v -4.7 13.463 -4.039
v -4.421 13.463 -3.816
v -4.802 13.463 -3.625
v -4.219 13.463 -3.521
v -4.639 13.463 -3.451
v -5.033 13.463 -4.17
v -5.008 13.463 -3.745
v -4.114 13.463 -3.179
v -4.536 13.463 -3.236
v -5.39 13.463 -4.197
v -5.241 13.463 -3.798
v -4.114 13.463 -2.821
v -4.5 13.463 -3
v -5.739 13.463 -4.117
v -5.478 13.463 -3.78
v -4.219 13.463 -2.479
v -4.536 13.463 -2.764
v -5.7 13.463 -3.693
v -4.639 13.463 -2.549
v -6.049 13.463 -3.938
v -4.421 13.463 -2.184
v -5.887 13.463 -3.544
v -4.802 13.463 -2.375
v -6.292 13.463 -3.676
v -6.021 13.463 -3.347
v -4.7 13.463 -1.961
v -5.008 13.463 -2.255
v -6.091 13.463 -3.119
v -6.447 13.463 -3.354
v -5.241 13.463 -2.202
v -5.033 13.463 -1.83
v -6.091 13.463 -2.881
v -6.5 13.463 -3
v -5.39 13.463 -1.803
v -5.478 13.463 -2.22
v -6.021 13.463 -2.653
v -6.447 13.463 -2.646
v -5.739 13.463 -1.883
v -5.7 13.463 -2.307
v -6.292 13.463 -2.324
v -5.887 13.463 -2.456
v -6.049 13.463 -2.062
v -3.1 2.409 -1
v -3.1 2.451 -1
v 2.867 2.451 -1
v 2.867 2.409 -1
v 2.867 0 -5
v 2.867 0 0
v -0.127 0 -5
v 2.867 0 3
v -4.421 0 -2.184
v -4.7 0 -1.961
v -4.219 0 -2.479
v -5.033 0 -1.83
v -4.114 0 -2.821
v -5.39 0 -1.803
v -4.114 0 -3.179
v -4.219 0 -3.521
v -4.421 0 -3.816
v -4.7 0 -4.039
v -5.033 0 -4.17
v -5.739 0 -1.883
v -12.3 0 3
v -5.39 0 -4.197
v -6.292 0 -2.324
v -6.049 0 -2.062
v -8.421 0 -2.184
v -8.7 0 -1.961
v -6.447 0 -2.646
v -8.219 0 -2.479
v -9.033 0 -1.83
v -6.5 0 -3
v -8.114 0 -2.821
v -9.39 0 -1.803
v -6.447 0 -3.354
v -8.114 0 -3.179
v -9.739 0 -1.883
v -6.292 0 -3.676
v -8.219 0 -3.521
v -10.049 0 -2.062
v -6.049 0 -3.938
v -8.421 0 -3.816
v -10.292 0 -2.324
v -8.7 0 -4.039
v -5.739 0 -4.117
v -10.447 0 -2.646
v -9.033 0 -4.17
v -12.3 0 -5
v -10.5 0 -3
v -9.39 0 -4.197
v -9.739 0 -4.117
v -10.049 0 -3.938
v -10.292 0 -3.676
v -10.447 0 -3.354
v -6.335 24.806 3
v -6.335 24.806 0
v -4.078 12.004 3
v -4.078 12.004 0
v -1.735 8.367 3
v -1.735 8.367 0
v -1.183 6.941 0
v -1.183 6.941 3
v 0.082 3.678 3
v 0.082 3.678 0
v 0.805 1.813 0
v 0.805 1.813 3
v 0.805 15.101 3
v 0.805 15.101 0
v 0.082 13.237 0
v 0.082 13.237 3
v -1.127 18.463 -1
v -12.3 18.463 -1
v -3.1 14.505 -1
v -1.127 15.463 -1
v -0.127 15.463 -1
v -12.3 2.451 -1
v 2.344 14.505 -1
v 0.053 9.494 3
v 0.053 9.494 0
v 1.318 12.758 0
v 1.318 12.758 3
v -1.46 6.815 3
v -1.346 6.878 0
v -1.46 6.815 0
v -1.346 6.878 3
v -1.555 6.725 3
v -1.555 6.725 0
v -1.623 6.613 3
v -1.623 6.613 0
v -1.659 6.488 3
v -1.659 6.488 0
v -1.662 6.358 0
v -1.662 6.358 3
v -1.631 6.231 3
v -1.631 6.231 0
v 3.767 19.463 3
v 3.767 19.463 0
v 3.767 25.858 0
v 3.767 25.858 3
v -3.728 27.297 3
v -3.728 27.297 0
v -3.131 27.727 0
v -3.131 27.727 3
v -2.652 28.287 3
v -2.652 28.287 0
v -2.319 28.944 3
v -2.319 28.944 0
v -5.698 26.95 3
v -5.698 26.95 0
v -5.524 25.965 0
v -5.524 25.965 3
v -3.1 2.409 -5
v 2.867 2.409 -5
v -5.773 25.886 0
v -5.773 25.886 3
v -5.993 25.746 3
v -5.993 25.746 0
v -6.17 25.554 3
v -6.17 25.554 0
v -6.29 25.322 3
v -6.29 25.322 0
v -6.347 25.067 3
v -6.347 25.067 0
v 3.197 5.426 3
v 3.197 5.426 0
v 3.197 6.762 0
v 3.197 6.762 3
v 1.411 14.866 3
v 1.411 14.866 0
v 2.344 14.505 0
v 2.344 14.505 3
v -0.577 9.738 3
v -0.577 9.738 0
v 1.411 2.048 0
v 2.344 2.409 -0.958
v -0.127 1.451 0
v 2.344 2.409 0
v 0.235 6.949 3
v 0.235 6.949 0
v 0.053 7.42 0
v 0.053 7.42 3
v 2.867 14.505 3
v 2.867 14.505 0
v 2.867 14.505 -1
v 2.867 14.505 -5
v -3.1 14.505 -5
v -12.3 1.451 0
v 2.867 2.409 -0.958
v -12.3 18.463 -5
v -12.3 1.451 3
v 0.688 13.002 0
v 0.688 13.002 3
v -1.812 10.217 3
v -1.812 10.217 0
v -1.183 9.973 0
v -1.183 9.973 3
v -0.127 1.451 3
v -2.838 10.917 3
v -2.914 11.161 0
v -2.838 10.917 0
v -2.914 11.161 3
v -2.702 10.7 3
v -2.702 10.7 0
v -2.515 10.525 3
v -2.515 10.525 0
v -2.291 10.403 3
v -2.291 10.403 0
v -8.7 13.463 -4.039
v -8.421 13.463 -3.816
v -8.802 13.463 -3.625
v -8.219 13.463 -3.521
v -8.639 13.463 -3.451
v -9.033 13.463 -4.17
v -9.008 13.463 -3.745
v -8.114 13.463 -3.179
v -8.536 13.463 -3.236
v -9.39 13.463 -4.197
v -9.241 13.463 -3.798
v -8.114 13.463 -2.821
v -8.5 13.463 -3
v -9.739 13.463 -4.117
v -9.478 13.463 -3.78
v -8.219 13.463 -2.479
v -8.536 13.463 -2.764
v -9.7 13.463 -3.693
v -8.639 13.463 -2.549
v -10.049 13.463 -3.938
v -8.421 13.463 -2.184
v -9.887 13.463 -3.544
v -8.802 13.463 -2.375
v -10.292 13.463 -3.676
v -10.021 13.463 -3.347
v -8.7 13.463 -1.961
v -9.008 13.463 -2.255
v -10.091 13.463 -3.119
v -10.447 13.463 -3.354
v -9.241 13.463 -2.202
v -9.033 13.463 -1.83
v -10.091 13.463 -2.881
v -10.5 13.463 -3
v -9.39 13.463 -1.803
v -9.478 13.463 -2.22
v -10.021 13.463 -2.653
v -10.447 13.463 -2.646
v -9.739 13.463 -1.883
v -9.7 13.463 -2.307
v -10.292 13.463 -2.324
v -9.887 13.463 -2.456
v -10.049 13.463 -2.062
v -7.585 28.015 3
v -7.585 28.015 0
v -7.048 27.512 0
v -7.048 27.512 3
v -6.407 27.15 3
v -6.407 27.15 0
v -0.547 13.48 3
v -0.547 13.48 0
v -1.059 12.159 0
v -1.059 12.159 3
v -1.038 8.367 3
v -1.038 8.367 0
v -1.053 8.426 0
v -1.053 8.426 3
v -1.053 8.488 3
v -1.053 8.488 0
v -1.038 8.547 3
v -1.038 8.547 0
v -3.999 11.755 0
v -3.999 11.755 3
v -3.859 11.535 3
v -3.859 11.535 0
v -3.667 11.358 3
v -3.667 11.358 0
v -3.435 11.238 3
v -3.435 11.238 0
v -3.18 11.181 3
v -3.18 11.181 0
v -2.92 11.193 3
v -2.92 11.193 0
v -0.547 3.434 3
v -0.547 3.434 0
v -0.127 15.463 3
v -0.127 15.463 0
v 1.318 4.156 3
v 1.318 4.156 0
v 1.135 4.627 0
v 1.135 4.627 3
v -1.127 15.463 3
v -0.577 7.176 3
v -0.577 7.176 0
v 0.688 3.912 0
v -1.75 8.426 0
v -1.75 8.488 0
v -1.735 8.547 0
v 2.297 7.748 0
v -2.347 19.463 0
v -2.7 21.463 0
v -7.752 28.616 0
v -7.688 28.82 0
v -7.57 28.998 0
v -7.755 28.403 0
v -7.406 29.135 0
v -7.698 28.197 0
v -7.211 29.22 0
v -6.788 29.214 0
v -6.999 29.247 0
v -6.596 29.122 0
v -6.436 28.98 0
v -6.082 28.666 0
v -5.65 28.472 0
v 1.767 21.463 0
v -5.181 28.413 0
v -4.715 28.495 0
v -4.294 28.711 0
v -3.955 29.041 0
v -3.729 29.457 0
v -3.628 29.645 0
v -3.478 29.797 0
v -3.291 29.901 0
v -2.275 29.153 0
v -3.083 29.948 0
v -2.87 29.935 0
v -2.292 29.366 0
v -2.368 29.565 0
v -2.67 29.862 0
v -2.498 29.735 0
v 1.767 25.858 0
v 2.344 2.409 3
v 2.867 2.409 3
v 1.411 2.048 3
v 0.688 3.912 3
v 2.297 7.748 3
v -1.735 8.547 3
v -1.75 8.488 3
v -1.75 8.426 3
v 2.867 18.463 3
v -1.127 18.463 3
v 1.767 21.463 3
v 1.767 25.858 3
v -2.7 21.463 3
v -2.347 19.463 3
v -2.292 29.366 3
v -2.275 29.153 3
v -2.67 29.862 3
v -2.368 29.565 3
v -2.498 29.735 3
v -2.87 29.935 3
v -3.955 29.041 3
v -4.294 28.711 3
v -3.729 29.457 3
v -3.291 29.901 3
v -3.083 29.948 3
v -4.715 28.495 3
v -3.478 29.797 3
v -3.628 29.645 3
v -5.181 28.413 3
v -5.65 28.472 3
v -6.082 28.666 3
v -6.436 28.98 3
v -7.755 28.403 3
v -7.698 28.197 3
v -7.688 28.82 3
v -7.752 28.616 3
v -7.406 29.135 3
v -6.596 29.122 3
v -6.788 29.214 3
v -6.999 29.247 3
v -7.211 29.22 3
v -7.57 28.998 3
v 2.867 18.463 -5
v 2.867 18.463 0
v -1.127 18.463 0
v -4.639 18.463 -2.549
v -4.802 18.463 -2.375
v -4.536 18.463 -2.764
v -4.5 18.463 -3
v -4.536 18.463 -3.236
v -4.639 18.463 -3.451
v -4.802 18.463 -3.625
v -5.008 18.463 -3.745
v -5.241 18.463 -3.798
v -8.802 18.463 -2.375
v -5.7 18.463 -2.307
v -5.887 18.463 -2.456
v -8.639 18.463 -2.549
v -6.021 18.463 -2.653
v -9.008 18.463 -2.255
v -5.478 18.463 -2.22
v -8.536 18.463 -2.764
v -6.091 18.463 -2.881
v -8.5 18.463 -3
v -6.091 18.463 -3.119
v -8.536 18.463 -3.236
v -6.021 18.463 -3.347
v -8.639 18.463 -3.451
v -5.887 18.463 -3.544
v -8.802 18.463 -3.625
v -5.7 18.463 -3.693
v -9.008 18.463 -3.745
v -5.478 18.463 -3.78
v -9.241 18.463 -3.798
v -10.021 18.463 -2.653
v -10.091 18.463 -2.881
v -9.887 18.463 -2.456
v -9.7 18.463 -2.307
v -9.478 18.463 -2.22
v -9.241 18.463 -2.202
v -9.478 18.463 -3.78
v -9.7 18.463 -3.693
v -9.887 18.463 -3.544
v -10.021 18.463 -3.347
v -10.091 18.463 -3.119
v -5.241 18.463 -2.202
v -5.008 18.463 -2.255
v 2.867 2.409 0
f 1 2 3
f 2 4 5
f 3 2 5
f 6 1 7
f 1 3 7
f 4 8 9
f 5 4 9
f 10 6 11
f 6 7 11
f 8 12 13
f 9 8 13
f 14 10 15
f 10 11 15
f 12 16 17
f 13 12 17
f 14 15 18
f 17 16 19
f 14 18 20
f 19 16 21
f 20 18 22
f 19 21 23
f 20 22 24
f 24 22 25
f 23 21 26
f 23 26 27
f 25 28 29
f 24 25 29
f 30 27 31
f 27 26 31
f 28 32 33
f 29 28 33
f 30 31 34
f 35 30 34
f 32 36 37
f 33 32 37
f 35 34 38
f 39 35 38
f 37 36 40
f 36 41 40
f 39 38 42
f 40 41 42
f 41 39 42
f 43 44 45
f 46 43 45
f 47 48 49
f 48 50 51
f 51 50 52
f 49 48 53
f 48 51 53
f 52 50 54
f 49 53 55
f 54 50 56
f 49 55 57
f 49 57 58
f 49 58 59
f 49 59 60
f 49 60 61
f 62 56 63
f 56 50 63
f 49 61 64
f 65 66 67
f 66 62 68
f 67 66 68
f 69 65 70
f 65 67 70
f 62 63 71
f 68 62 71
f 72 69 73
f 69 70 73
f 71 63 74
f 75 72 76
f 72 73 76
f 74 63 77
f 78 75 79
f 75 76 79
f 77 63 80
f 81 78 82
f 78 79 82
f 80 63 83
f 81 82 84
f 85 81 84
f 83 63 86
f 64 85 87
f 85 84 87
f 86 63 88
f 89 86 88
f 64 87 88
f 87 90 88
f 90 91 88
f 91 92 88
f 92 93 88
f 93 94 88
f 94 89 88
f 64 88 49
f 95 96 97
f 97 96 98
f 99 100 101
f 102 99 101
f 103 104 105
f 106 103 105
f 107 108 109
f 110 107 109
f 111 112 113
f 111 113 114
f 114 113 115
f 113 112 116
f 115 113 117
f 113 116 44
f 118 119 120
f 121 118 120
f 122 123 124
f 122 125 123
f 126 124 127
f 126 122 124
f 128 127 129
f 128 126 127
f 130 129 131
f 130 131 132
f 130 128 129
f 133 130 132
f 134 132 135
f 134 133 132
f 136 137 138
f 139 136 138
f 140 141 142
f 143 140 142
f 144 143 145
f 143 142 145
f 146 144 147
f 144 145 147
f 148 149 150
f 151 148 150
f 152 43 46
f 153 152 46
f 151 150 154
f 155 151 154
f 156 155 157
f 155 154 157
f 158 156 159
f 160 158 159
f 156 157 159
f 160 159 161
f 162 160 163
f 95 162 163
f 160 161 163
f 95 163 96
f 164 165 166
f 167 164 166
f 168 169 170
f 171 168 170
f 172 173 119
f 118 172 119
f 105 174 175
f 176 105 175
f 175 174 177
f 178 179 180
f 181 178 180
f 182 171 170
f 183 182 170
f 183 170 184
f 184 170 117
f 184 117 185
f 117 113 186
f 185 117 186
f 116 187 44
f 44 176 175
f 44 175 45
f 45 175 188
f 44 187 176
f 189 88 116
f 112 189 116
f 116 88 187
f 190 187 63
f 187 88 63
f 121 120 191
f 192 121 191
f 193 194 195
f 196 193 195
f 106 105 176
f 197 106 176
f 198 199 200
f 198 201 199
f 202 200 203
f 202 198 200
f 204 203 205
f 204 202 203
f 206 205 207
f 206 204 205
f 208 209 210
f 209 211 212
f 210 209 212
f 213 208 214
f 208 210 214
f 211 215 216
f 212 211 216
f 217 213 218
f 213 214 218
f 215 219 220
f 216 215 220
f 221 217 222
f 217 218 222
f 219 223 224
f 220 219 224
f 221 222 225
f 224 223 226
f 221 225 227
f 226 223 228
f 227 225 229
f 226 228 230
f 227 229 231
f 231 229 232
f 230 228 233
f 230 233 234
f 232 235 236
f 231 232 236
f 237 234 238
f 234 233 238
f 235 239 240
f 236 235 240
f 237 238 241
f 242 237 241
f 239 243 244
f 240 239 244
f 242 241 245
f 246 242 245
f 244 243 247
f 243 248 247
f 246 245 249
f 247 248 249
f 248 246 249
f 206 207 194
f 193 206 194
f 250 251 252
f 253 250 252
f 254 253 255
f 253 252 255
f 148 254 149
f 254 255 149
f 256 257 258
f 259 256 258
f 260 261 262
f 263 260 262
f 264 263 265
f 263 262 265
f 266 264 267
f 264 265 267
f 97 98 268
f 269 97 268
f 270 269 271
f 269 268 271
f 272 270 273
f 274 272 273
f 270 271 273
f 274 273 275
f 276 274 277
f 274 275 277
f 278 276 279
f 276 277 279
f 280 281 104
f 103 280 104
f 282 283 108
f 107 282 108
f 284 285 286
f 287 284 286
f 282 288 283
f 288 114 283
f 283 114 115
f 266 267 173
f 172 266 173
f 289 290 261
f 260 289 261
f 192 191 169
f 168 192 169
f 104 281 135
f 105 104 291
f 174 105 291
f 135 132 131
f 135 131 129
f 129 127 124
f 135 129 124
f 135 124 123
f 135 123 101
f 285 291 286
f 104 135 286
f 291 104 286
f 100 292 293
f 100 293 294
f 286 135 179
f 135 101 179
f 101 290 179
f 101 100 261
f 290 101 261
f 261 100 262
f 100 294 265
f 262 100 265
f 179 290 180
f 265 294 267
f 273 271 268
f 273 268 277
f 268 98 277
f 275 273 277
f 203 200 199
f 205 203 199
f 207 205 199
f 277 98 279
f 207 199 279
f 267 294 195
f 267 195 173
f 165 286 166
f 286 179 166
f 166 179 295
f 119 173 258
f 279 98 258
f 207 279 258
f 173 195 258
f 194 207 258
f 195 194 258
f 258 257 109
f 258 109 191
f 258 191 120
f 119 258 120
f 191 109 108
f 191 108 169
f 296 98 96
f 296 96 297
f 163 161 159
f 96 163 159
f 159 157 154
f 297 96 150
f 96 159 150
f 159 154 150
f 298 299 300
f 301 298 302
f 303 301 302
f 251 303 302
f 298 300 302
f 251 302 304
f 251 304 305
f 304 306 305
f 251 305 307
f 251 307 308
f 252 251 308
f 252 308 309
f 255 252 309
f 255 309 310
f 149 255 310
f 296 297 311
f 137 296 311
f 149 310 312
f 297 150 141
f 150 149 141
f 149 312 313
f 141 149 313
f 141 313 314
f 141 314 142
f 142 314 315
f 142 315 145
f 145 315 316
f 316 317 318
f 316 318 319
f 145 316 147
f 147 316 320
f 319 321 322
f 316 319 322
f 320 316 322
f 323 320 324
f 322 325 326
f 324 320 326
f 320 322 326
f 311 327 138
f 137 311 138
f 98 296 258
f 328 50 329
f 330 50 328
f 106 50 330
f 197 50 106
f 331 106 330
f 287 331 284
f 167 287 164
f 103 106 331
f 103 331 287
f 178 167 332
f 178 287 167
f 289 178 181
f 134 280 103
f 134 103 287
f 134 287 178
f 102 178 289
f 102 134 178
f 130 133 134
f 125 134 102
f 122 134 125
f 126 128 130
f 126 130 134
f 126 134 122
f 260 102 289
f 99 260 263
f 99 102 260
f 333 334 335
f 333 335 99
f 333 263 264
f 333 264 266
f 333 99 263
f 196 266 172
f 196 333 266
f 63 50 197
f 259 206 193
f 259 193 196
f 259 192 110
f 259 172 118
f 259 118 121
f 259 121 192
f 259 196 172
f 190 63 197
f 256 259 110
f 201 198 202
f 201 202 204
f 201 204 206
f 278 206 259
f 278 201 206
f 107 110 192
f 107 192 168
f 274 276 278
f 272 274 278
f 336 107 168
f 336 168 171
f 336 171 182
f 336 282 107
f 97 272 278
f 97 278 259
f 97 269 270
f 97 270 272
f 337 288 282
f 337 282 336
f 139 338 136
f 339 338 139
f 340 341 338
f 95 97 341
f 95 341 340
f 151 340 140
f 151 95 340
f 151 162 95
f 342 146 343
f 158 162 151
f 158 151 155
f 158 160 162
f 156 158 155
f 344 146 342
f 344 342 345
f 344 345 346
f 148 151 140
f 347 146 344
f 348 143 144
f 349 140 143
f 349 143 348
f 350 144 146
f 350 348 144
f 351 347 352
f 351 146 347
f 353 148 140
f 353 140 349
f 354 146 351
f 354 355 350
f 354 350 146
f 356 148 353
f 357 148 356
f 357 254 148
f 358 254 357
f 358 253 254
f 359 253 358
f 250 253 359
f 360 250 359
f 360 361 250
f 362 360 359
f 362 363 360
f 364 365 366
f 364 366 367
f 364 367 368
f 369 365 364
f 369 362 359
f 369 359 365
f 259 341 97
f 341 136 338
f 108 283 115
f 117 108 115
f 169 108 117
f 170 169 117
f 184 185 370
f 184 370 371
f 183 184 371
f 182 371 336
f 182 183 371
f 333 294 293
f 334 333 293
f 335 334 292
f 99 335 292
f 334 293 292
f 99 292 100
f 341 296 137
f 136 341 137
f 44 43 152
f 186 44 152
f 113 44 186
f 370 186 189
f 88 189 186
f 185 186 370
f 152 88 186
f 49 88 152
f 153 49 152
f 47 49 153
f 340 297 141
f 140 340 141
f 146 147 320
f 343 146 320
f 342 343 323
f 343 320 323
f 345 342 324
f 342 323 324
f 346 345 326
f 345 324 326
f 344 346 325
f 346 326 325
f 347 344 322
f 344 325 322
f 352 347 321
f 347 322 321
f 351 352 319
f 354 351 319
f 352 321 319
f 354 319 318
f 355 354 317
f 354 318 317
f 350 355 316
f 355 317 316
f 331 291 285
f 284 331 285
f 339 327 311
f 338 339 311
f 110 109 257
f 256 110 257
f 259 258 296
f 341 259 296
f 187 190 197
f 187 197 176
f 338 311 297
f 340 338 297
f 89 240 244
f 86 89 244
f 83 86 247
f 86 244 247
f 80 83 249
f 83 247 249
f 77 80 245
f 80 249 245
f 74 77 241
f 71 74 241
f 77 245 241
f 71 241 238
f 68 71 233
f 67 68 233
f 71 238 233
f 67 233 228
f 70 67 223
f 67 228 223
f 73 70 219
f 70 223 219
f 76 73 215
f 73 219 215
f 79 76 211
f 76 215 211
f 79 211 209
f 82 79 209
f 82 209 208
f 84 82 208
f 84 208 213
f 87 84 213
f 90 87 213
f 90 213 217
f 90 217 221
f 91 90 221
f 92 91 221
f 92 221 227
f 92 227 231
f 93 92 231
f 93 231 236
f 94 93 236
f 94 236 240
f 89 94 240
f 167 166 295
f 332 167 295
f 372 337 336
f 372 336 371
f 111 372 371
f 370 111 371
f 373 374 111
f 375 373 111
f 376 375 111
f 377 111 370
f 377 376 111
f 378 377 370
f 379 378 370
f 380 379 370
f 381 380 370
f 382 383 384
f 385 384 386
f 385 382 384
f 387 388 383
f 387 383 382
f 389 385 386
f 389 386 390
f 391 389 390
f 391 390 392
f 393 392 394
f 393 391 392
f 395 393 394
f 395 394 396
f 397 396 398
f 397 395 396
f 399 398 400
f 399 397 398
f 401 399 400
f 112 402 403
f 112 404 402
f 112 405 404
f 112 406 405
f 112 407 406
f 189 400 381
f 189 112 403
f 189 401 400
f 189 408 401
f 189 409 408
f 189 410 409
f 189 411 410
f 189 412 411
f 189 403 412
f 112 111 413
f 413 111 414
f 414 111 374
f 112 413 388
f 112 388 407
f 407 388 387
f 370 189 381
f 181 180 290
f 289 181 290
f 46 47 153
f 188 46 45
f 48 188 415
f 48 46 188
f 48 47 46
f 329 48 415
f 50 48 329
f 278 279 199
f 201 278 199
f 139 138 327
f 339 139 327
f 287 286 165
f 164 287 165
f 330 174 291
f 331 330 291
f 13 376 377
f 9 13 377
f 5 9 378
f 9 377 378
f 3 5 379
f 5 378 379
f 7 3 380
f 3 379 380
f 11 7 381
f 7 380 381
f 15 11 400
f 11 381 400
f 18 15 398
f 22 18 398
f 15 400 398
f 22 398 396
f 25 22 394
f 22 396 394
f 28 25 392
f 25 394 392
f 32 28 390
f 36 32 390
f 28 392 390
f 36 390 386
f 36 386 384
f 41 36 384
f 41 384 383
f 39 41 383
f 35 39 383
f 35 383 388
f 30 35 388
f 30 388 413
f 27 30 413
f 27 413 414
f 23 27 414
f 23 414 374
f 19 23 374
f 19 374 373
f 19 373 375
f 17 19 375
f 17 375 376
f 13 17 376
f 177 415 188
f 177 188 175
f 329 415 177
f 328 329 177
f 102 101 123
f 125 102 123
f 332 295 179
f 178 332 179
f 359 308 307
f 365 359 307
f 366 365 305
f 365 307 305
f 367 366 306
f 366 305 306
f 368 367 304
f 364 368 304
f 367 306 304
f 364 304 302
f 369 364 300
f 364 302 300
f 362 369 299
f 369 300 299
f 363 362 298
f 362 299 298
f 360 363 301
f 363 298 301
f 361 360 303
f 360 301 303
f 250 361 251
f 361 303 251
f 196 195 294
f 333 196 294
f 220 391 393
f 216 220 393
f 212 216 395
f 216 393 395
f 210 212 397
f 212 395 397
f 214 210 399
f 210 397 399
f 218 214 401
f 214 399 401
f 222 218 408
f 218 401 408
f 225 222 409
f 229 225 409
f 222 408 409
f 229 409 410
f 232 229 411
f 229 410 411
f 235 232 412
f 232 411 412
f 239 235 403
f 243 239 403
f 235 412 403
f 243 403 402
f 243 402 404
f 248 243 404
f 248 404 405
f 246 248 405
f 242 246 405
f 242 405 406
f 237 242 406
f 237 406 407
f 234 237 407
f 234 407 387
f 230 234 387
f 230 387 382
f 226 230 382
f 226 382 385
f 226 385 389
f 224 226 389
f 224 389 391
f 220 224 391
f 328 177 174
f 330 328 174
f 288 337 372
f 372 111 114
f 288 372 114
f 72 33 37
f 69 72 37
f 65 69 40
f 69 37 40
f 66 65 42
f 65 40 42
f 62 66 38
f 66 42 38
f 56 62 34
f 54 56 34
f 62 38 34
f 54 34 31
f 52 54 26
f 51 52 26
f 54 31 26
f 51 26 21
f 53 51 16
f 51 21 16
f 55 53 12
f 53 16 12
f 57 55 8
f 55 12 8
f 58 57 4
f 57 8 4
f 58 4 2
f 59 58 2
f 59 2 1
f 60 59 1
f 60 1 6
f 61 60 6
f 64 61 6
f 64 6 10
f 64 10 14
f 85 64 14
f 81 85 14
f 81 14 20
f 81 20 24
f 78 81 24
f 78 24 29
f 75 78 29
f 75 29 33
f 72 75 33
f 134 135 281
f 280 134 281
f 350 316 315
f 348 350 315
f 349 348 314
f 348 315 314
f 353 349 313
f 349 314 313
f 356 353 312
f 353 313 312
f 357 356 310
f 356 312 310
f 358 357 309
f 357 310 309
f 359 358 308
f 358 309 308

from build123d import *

# Parameters (mm, degrees)
BOSS_SWITCH_BODY_DEPTH            = 3
SKETCH1_W                         = 2.994375291
SKETCH1_H                         = 2.409101515
SKETCH1_W_2                       = 3.994375291
SKETCH1_H_2                       = 3.957767538
BOSS_FLANGE_WIDTH_DEPTH           = 5
BOSS_FLANGE_HEIGHT_REACH          = 36.354
SKETCH2_W                         = 4
SKETCH2_H                         = 3.957767538
SKETCH2_W_2                       = 8
SKETCH2_H_2                       = 1.451333978
SKETCH17_W                        = 15.1675
SKETCH17_H                        = 4
BOSS_FLANGE_SUPPORT_DEPTH         = 13.053634428
CUT_WALL_GAP_DEPTH                = 1
TAP_DRILL_FOR_M2X0_4_TAP1_D       = 1.6
M2_CLEARANCE_HOLE2_D              = 2.4
M2_CLEARANCE_HOLE2_DEPTH          = 13.462735941
CHAMFER_FLANGE_SUPPORT_3_SIZE     = 1
FILLET1_R                         = 1
FILLET2_R                         = 0.5
SKETCH28_W                        = 5.9675
SKETCH28_H                        = 12.095866891
CUT_PRINT_SUPPORT_CLEARANCE_DEPTH = 33.624103931


with BuildPart() as part:
    # Sketch-SwitchBossUp → Boss-Switch Body (new body)
    with BuildSketch(Plane.XY):
        with BuildLine():
            Line((-5.697895702, 26.949658376), (-5.524247524, 25.964850623))
            ThreePointArc((-5.524247524, 25.964850623), (-6.169751391, 25.553619307), (-6.3354071, 24.806394693))
            Line((-6.3354071, 24.806394693), (-4.07798079, 12.003893904))
            ThreePointArc((-4.07798079, 12.003893904), (-3.666749473, 11.358390037), (-2.919524859, 11.192734328))
            Line((-2.919524859, 11.192734328), (-2.816117912, 10.606284387))
            Line((-2.816117912, 10.606284387), (-1.811990528, 10.217060362))
            Line((-1.811990528, 10.217060362), (-1.182618868, 9.973100706))
            Line((-1.182618868, 9.973100706), (-1.735258621, 8.547390389))
            ThreePointArc((-1.735258621, 8.547390389), (-1.752158006, 8.457034961), (-1.735258621, 8.366679532))
            Line((-1.735258621, 8.366679532), (-1.182618868, 6.940969215))
            Line((-1.182618868, 6.940969215), (-1.811990528, 6.697009559))
            Line((-1.811990528, 6.697009559), (-0.547014535, 3.433600952))
            Line((-0.547014535, 3.433600952), (0.082357125, 3.677560608))
            Line((0.082357125, 3.677560608), (0.805200549, 1.81275569))
            Line((0.805200549, 1.81275569), (-0.12720191, 1.451333978))
            Line((-0.12720191, 1.451333978), (-0.12720191, 0))
            Line((-0.12720191, 0), (2.867173381, 0))
            Line((2.867173381, 0), (2.867173381, 2.409101515))
            Line((2.867173381, 2.409101515), (2.343664607, 2.409101515))
            Line((2.343664607, 2.409101515), (1.411262148, 2.047679803))
            Line((1.411262148, 2.047679803), (0.688418723, 3.912484721))
            Line((0.688418723, 3.912484721), (1.317790383, 4.156444377))
            Line((1.317790383, 4.156444377), (1.13533703, 4.627140933))
            Line((1.13533703, 4.627140933), (3.197473995, 5.426475025))
            Line((3.197473995, 5.426475025), (3.197473995, 6.761927069))
            Line((3.197473995, 6.761927069), (2.297289747, 7.748445958))
            Line((2.297289747, 7.748445958), (0.235267743, 6.949156428))
            Line((0.235267743, 6.949156428), (0.05281439, 7.419852984))
            Line((0.05281439, 7.419852984), (-0.57655727, 7.175893328))
            Line((-0.57655727, 7.175893328), (-1.038134762, 8.366679532))
            ThreePointArc((-1.038134762, 8.366679532), (-1.055034148, 8.457034961), (-1.038134762, 8.547390389))
            Line((-1.038134762, 8.547390389), (-0.57655727, 9.738176593))
            Line((-0.57655727, 9.738176593), (0.05281439, 9.494216937))
            Line((0.05281439, 9.494216937), (1.317790383, 12.757625544))
            Line((1.317790383, 12.757625544), (0.688418723, 13.0015852))
            Line((0.688418723, 13.0015852), (1.411262148, 14.866390118))
            Line((1.411262148, 14.866390118), (2.343664607, 14.504968406))
            Line((2.343664607, 14.504968406), (2.867173381, 14.504968406))
            Line((2.867173381, 14.504968406), (2.867173381, 18.462735944))
            Line((2.867173381, 18.462735944), (-0.111637615, 18.462735944))
            Line((-0.111637615, 18.462735944), (-1.12720191, 18.462735944))
            Line((-1.12720191, 18.462735944), (-1.12720191, 15.462735944))
            Line((-1.12720191, 15.462735944), (-0.12720191, 15.462735944))
            Line((-0.12720191, 15.462735944), (0.805200549, 15.101314231))
            Line((0.805200549, 15.101314231), (0.082357125, 13.236509313))
            Line((0.082357125, 13.236509313), (-0.547014535, 13.480468969))
            Line((-0.547014535, 13.480468969), (-1.059112089, 12.159350171))
            Line((-1.059112089, 12.159350171), (-2.346896051, 19.462735944))
            Line((-2.346896051, 19.462735944), (3.767173381, 19.462735944))
            Line((3.767173381, 19.462735944), (3.767173381, 25.857619356))
            Line((3.767173381, 25.857619356), (1.767173381, 25.857619356))
            Line((1.767173381, 25.857619356), (1.767173381, 21.462735944))
            Line((1.767173381, 21.462735944), (-2.699550012, 21.462735944))
            Line((-2.699550012, 21.462735944), (-3.728280196, 27.296954732))
            ThreePointArc((-3.728280196, 27.296954732), (-2.874356585, 27.992742953), (-2.319025652, 28.944012807))
            ThreePointArc((-2.319025652, 28.944012807), (-2.76728001, 29.905297381), (-3.728564583, 29.457043022))
            ThreePointArc((-3.728564583, 29.457043022), (-4.944660137, 28.436617692), (-6.436422172, 28.97957467))
            ThreePointArc((-6.436422172, 28.97957467), (-7.493046212, 29.072017295), (-7.585488837, 28.015393255))
            ThreePointArc((-7.585488837, 28.015393255), (-6.738295005, 27.311426358), (-5.697895702, 26.949658376))
        make_face()
    extrude(amount=BOSS_SWITCH_BODY_DEPTH)

    # Sketch1 → Boss-Flange Width (add)
    with BuildSketch(Plane(origin=(0, 0, 0), x_dir=(-1, 0, 0), z_dir=(0, 0, -1))):
        with Locations((-1.369985736, 1.204550758)):
            Rectangle(SKETCH1_W, SKETCH1_H)
        with Locations((-0.869985736, 16.483852175)):
            Rectangle(SKETCH1_W_2, SKETCH1_H_2)
    extrude(amount=BOSS_FLANGE_WIDTH_DEPTH)

    # Boss-Flange Height: up to this face of the body (flat: up to its plane)
    boss_flange_height_end = Plane(part.part.faces().sort_by_distance((-0.12720191, 1.077409098, -1.438016547))[0])
    # Sketch2 → Boss-Flange Height (add, up to the picked face)
    with BuildSketch(Plane(origin=(-12.300326619, 0, 0), x_dir=(0, 0, -1), z_dir=(1, 0, 0)), mode=Mode.PRIVATE) as boss_flange_height_sk1:
        with Locations((3, 16.483852175)):
            Rectangle(SKETCH2_W, SKETCH2_H)
    boss_flange_height_tool1 = split(extrude(boss_flange_height_sk1.sketch, amount=BOSS_FLANGE_HEIGHT_REACH, mode=Mode.PRIVATE), bisect_by=boss_flange_height_end, keep=Keep.BOTH, mode=Mode.PRIVATE)
    # Sketch2 → Boss-Flange Height (add, up to the picked face)
    with BuildSketch(Plane(origin=(-12.300326619, 0, 0), x_dir=(0, 0, -1), z_dir=(1, 0, 0)), mode=Mode.PRIVATE) as boss_flange_height_sk2:
        with Locations((1, 0.725666989)):
            Rectangle(SKETCH2_W_2, SKETCH2_H_2)
    boss_flange_height_tool2 = split(extrude(boss_flange_height_sk2.sketch, amount=BOSS_FLANGE_HEIGHT_REACH, mode=Mode.PRIVATE), bisect_by=boss_flange_height_end, keep=Keep.BOTH, mode=Mode.PRIVATE)
    add(boss_flange_height_tool1.solids().sort_by(Axis((-12.300327, 16.483852, -3), (1, 0, 0)))[0])
    add(boss_flange_height_tool2.solids().sort_by(Axis((-12.300327, 0.725667, -1), (1, 0, 0)))[0])

    # Sketch17 → Boss-Flange Support (add)
    with BuildSketch(Plane.XZ.offset(-1.451333978)):
        with Locations((-4.716576619, -3)):
            Rectangle(SKETCH17_W, SKETCH17_H)
    extrude(amount=-BOSS_FLANGE_SUPPORT_DEPTH)

    # Sketch27 → Cut-Wall Gap (cut)
    with BuildSketch(Plane.XY):
        Polygon((-0.12720191, 15.462735944), (2.343664607, 14.504968406), (-1.12720191, 14.504968406), (-1.12720191, 15.462735944), align=None)
        Polygon((2.343664607, 2.409101515), (-0.12720191, 2.409101515), (-0.12720191, 1.451333978), align=None)
    extrude(amount=-CUT_WALL_GAP_DEPTH, mode=Mode.SUBTRACT)

    # Tap Drill for M2x0.4 Tap1 (through all)
    with Locations(Plane(origin=(0, 0, 0), x_dir=(-1, 0, 0), z_dir=(0, -1, 0))):
        with Locations((9.300326619, 3), (5.300326619, 3)):
            Hole(TAP_DRILL_FOR_M2X0_4_TAP1_D / 2)

    # M2 Clearance Hole2
    with Locations(Plane.XZ):
        with Locations((-9.300326619, -3), (-5.300326619, -3)):
            Hole(M2_CLEARANCE_HOLE2_D / 2, depth=M2_CLEARANCE_HOLE2_DEPTH)

    # Chamfer-Flange Support 3
    chamfer_flange_support_3_edges = [part.edges().sort_by_distance(p)[0] for p in [
        (-6.213764264, 1.451333978, -1),
    ]]
    chamfer(chamfer_flange_support_3_edges, length=CHAMFER_FLANGE_SUPPORT_3_SIZE)

    # Fillet1
    fillet1_edges = [part.edges().sort_by_distance(p)[0] for p in [
        (-2.816117912, 10.606284387, 1.5),
    ]]
    fillet(fillet1_edges, radius=FILLET1_R)

    # Fillet2
    fillet2_edges = [part.edges().sort_by_distance(p)[0] for p in [
        (-1.811990528, 6.697009559, 1.5),
    ]]
    fillet(fillet2_edges, radius=FILLET2_R)

    # Sketch28 → Cut-Print Support Clearance (cut, through all)
    with BuildSketch(Plane.XY.offset(-1)):
        with Locations((-0.116576619, 8.457034961)):
            Rectangle(SKETCH28_W, SKETCH28_H)
    extrude(amount=-CUT_PRINT_SUPPORT_CLEARANCE_DEPTH, mode=Mode.SUBTRACT)


solid = part.part
